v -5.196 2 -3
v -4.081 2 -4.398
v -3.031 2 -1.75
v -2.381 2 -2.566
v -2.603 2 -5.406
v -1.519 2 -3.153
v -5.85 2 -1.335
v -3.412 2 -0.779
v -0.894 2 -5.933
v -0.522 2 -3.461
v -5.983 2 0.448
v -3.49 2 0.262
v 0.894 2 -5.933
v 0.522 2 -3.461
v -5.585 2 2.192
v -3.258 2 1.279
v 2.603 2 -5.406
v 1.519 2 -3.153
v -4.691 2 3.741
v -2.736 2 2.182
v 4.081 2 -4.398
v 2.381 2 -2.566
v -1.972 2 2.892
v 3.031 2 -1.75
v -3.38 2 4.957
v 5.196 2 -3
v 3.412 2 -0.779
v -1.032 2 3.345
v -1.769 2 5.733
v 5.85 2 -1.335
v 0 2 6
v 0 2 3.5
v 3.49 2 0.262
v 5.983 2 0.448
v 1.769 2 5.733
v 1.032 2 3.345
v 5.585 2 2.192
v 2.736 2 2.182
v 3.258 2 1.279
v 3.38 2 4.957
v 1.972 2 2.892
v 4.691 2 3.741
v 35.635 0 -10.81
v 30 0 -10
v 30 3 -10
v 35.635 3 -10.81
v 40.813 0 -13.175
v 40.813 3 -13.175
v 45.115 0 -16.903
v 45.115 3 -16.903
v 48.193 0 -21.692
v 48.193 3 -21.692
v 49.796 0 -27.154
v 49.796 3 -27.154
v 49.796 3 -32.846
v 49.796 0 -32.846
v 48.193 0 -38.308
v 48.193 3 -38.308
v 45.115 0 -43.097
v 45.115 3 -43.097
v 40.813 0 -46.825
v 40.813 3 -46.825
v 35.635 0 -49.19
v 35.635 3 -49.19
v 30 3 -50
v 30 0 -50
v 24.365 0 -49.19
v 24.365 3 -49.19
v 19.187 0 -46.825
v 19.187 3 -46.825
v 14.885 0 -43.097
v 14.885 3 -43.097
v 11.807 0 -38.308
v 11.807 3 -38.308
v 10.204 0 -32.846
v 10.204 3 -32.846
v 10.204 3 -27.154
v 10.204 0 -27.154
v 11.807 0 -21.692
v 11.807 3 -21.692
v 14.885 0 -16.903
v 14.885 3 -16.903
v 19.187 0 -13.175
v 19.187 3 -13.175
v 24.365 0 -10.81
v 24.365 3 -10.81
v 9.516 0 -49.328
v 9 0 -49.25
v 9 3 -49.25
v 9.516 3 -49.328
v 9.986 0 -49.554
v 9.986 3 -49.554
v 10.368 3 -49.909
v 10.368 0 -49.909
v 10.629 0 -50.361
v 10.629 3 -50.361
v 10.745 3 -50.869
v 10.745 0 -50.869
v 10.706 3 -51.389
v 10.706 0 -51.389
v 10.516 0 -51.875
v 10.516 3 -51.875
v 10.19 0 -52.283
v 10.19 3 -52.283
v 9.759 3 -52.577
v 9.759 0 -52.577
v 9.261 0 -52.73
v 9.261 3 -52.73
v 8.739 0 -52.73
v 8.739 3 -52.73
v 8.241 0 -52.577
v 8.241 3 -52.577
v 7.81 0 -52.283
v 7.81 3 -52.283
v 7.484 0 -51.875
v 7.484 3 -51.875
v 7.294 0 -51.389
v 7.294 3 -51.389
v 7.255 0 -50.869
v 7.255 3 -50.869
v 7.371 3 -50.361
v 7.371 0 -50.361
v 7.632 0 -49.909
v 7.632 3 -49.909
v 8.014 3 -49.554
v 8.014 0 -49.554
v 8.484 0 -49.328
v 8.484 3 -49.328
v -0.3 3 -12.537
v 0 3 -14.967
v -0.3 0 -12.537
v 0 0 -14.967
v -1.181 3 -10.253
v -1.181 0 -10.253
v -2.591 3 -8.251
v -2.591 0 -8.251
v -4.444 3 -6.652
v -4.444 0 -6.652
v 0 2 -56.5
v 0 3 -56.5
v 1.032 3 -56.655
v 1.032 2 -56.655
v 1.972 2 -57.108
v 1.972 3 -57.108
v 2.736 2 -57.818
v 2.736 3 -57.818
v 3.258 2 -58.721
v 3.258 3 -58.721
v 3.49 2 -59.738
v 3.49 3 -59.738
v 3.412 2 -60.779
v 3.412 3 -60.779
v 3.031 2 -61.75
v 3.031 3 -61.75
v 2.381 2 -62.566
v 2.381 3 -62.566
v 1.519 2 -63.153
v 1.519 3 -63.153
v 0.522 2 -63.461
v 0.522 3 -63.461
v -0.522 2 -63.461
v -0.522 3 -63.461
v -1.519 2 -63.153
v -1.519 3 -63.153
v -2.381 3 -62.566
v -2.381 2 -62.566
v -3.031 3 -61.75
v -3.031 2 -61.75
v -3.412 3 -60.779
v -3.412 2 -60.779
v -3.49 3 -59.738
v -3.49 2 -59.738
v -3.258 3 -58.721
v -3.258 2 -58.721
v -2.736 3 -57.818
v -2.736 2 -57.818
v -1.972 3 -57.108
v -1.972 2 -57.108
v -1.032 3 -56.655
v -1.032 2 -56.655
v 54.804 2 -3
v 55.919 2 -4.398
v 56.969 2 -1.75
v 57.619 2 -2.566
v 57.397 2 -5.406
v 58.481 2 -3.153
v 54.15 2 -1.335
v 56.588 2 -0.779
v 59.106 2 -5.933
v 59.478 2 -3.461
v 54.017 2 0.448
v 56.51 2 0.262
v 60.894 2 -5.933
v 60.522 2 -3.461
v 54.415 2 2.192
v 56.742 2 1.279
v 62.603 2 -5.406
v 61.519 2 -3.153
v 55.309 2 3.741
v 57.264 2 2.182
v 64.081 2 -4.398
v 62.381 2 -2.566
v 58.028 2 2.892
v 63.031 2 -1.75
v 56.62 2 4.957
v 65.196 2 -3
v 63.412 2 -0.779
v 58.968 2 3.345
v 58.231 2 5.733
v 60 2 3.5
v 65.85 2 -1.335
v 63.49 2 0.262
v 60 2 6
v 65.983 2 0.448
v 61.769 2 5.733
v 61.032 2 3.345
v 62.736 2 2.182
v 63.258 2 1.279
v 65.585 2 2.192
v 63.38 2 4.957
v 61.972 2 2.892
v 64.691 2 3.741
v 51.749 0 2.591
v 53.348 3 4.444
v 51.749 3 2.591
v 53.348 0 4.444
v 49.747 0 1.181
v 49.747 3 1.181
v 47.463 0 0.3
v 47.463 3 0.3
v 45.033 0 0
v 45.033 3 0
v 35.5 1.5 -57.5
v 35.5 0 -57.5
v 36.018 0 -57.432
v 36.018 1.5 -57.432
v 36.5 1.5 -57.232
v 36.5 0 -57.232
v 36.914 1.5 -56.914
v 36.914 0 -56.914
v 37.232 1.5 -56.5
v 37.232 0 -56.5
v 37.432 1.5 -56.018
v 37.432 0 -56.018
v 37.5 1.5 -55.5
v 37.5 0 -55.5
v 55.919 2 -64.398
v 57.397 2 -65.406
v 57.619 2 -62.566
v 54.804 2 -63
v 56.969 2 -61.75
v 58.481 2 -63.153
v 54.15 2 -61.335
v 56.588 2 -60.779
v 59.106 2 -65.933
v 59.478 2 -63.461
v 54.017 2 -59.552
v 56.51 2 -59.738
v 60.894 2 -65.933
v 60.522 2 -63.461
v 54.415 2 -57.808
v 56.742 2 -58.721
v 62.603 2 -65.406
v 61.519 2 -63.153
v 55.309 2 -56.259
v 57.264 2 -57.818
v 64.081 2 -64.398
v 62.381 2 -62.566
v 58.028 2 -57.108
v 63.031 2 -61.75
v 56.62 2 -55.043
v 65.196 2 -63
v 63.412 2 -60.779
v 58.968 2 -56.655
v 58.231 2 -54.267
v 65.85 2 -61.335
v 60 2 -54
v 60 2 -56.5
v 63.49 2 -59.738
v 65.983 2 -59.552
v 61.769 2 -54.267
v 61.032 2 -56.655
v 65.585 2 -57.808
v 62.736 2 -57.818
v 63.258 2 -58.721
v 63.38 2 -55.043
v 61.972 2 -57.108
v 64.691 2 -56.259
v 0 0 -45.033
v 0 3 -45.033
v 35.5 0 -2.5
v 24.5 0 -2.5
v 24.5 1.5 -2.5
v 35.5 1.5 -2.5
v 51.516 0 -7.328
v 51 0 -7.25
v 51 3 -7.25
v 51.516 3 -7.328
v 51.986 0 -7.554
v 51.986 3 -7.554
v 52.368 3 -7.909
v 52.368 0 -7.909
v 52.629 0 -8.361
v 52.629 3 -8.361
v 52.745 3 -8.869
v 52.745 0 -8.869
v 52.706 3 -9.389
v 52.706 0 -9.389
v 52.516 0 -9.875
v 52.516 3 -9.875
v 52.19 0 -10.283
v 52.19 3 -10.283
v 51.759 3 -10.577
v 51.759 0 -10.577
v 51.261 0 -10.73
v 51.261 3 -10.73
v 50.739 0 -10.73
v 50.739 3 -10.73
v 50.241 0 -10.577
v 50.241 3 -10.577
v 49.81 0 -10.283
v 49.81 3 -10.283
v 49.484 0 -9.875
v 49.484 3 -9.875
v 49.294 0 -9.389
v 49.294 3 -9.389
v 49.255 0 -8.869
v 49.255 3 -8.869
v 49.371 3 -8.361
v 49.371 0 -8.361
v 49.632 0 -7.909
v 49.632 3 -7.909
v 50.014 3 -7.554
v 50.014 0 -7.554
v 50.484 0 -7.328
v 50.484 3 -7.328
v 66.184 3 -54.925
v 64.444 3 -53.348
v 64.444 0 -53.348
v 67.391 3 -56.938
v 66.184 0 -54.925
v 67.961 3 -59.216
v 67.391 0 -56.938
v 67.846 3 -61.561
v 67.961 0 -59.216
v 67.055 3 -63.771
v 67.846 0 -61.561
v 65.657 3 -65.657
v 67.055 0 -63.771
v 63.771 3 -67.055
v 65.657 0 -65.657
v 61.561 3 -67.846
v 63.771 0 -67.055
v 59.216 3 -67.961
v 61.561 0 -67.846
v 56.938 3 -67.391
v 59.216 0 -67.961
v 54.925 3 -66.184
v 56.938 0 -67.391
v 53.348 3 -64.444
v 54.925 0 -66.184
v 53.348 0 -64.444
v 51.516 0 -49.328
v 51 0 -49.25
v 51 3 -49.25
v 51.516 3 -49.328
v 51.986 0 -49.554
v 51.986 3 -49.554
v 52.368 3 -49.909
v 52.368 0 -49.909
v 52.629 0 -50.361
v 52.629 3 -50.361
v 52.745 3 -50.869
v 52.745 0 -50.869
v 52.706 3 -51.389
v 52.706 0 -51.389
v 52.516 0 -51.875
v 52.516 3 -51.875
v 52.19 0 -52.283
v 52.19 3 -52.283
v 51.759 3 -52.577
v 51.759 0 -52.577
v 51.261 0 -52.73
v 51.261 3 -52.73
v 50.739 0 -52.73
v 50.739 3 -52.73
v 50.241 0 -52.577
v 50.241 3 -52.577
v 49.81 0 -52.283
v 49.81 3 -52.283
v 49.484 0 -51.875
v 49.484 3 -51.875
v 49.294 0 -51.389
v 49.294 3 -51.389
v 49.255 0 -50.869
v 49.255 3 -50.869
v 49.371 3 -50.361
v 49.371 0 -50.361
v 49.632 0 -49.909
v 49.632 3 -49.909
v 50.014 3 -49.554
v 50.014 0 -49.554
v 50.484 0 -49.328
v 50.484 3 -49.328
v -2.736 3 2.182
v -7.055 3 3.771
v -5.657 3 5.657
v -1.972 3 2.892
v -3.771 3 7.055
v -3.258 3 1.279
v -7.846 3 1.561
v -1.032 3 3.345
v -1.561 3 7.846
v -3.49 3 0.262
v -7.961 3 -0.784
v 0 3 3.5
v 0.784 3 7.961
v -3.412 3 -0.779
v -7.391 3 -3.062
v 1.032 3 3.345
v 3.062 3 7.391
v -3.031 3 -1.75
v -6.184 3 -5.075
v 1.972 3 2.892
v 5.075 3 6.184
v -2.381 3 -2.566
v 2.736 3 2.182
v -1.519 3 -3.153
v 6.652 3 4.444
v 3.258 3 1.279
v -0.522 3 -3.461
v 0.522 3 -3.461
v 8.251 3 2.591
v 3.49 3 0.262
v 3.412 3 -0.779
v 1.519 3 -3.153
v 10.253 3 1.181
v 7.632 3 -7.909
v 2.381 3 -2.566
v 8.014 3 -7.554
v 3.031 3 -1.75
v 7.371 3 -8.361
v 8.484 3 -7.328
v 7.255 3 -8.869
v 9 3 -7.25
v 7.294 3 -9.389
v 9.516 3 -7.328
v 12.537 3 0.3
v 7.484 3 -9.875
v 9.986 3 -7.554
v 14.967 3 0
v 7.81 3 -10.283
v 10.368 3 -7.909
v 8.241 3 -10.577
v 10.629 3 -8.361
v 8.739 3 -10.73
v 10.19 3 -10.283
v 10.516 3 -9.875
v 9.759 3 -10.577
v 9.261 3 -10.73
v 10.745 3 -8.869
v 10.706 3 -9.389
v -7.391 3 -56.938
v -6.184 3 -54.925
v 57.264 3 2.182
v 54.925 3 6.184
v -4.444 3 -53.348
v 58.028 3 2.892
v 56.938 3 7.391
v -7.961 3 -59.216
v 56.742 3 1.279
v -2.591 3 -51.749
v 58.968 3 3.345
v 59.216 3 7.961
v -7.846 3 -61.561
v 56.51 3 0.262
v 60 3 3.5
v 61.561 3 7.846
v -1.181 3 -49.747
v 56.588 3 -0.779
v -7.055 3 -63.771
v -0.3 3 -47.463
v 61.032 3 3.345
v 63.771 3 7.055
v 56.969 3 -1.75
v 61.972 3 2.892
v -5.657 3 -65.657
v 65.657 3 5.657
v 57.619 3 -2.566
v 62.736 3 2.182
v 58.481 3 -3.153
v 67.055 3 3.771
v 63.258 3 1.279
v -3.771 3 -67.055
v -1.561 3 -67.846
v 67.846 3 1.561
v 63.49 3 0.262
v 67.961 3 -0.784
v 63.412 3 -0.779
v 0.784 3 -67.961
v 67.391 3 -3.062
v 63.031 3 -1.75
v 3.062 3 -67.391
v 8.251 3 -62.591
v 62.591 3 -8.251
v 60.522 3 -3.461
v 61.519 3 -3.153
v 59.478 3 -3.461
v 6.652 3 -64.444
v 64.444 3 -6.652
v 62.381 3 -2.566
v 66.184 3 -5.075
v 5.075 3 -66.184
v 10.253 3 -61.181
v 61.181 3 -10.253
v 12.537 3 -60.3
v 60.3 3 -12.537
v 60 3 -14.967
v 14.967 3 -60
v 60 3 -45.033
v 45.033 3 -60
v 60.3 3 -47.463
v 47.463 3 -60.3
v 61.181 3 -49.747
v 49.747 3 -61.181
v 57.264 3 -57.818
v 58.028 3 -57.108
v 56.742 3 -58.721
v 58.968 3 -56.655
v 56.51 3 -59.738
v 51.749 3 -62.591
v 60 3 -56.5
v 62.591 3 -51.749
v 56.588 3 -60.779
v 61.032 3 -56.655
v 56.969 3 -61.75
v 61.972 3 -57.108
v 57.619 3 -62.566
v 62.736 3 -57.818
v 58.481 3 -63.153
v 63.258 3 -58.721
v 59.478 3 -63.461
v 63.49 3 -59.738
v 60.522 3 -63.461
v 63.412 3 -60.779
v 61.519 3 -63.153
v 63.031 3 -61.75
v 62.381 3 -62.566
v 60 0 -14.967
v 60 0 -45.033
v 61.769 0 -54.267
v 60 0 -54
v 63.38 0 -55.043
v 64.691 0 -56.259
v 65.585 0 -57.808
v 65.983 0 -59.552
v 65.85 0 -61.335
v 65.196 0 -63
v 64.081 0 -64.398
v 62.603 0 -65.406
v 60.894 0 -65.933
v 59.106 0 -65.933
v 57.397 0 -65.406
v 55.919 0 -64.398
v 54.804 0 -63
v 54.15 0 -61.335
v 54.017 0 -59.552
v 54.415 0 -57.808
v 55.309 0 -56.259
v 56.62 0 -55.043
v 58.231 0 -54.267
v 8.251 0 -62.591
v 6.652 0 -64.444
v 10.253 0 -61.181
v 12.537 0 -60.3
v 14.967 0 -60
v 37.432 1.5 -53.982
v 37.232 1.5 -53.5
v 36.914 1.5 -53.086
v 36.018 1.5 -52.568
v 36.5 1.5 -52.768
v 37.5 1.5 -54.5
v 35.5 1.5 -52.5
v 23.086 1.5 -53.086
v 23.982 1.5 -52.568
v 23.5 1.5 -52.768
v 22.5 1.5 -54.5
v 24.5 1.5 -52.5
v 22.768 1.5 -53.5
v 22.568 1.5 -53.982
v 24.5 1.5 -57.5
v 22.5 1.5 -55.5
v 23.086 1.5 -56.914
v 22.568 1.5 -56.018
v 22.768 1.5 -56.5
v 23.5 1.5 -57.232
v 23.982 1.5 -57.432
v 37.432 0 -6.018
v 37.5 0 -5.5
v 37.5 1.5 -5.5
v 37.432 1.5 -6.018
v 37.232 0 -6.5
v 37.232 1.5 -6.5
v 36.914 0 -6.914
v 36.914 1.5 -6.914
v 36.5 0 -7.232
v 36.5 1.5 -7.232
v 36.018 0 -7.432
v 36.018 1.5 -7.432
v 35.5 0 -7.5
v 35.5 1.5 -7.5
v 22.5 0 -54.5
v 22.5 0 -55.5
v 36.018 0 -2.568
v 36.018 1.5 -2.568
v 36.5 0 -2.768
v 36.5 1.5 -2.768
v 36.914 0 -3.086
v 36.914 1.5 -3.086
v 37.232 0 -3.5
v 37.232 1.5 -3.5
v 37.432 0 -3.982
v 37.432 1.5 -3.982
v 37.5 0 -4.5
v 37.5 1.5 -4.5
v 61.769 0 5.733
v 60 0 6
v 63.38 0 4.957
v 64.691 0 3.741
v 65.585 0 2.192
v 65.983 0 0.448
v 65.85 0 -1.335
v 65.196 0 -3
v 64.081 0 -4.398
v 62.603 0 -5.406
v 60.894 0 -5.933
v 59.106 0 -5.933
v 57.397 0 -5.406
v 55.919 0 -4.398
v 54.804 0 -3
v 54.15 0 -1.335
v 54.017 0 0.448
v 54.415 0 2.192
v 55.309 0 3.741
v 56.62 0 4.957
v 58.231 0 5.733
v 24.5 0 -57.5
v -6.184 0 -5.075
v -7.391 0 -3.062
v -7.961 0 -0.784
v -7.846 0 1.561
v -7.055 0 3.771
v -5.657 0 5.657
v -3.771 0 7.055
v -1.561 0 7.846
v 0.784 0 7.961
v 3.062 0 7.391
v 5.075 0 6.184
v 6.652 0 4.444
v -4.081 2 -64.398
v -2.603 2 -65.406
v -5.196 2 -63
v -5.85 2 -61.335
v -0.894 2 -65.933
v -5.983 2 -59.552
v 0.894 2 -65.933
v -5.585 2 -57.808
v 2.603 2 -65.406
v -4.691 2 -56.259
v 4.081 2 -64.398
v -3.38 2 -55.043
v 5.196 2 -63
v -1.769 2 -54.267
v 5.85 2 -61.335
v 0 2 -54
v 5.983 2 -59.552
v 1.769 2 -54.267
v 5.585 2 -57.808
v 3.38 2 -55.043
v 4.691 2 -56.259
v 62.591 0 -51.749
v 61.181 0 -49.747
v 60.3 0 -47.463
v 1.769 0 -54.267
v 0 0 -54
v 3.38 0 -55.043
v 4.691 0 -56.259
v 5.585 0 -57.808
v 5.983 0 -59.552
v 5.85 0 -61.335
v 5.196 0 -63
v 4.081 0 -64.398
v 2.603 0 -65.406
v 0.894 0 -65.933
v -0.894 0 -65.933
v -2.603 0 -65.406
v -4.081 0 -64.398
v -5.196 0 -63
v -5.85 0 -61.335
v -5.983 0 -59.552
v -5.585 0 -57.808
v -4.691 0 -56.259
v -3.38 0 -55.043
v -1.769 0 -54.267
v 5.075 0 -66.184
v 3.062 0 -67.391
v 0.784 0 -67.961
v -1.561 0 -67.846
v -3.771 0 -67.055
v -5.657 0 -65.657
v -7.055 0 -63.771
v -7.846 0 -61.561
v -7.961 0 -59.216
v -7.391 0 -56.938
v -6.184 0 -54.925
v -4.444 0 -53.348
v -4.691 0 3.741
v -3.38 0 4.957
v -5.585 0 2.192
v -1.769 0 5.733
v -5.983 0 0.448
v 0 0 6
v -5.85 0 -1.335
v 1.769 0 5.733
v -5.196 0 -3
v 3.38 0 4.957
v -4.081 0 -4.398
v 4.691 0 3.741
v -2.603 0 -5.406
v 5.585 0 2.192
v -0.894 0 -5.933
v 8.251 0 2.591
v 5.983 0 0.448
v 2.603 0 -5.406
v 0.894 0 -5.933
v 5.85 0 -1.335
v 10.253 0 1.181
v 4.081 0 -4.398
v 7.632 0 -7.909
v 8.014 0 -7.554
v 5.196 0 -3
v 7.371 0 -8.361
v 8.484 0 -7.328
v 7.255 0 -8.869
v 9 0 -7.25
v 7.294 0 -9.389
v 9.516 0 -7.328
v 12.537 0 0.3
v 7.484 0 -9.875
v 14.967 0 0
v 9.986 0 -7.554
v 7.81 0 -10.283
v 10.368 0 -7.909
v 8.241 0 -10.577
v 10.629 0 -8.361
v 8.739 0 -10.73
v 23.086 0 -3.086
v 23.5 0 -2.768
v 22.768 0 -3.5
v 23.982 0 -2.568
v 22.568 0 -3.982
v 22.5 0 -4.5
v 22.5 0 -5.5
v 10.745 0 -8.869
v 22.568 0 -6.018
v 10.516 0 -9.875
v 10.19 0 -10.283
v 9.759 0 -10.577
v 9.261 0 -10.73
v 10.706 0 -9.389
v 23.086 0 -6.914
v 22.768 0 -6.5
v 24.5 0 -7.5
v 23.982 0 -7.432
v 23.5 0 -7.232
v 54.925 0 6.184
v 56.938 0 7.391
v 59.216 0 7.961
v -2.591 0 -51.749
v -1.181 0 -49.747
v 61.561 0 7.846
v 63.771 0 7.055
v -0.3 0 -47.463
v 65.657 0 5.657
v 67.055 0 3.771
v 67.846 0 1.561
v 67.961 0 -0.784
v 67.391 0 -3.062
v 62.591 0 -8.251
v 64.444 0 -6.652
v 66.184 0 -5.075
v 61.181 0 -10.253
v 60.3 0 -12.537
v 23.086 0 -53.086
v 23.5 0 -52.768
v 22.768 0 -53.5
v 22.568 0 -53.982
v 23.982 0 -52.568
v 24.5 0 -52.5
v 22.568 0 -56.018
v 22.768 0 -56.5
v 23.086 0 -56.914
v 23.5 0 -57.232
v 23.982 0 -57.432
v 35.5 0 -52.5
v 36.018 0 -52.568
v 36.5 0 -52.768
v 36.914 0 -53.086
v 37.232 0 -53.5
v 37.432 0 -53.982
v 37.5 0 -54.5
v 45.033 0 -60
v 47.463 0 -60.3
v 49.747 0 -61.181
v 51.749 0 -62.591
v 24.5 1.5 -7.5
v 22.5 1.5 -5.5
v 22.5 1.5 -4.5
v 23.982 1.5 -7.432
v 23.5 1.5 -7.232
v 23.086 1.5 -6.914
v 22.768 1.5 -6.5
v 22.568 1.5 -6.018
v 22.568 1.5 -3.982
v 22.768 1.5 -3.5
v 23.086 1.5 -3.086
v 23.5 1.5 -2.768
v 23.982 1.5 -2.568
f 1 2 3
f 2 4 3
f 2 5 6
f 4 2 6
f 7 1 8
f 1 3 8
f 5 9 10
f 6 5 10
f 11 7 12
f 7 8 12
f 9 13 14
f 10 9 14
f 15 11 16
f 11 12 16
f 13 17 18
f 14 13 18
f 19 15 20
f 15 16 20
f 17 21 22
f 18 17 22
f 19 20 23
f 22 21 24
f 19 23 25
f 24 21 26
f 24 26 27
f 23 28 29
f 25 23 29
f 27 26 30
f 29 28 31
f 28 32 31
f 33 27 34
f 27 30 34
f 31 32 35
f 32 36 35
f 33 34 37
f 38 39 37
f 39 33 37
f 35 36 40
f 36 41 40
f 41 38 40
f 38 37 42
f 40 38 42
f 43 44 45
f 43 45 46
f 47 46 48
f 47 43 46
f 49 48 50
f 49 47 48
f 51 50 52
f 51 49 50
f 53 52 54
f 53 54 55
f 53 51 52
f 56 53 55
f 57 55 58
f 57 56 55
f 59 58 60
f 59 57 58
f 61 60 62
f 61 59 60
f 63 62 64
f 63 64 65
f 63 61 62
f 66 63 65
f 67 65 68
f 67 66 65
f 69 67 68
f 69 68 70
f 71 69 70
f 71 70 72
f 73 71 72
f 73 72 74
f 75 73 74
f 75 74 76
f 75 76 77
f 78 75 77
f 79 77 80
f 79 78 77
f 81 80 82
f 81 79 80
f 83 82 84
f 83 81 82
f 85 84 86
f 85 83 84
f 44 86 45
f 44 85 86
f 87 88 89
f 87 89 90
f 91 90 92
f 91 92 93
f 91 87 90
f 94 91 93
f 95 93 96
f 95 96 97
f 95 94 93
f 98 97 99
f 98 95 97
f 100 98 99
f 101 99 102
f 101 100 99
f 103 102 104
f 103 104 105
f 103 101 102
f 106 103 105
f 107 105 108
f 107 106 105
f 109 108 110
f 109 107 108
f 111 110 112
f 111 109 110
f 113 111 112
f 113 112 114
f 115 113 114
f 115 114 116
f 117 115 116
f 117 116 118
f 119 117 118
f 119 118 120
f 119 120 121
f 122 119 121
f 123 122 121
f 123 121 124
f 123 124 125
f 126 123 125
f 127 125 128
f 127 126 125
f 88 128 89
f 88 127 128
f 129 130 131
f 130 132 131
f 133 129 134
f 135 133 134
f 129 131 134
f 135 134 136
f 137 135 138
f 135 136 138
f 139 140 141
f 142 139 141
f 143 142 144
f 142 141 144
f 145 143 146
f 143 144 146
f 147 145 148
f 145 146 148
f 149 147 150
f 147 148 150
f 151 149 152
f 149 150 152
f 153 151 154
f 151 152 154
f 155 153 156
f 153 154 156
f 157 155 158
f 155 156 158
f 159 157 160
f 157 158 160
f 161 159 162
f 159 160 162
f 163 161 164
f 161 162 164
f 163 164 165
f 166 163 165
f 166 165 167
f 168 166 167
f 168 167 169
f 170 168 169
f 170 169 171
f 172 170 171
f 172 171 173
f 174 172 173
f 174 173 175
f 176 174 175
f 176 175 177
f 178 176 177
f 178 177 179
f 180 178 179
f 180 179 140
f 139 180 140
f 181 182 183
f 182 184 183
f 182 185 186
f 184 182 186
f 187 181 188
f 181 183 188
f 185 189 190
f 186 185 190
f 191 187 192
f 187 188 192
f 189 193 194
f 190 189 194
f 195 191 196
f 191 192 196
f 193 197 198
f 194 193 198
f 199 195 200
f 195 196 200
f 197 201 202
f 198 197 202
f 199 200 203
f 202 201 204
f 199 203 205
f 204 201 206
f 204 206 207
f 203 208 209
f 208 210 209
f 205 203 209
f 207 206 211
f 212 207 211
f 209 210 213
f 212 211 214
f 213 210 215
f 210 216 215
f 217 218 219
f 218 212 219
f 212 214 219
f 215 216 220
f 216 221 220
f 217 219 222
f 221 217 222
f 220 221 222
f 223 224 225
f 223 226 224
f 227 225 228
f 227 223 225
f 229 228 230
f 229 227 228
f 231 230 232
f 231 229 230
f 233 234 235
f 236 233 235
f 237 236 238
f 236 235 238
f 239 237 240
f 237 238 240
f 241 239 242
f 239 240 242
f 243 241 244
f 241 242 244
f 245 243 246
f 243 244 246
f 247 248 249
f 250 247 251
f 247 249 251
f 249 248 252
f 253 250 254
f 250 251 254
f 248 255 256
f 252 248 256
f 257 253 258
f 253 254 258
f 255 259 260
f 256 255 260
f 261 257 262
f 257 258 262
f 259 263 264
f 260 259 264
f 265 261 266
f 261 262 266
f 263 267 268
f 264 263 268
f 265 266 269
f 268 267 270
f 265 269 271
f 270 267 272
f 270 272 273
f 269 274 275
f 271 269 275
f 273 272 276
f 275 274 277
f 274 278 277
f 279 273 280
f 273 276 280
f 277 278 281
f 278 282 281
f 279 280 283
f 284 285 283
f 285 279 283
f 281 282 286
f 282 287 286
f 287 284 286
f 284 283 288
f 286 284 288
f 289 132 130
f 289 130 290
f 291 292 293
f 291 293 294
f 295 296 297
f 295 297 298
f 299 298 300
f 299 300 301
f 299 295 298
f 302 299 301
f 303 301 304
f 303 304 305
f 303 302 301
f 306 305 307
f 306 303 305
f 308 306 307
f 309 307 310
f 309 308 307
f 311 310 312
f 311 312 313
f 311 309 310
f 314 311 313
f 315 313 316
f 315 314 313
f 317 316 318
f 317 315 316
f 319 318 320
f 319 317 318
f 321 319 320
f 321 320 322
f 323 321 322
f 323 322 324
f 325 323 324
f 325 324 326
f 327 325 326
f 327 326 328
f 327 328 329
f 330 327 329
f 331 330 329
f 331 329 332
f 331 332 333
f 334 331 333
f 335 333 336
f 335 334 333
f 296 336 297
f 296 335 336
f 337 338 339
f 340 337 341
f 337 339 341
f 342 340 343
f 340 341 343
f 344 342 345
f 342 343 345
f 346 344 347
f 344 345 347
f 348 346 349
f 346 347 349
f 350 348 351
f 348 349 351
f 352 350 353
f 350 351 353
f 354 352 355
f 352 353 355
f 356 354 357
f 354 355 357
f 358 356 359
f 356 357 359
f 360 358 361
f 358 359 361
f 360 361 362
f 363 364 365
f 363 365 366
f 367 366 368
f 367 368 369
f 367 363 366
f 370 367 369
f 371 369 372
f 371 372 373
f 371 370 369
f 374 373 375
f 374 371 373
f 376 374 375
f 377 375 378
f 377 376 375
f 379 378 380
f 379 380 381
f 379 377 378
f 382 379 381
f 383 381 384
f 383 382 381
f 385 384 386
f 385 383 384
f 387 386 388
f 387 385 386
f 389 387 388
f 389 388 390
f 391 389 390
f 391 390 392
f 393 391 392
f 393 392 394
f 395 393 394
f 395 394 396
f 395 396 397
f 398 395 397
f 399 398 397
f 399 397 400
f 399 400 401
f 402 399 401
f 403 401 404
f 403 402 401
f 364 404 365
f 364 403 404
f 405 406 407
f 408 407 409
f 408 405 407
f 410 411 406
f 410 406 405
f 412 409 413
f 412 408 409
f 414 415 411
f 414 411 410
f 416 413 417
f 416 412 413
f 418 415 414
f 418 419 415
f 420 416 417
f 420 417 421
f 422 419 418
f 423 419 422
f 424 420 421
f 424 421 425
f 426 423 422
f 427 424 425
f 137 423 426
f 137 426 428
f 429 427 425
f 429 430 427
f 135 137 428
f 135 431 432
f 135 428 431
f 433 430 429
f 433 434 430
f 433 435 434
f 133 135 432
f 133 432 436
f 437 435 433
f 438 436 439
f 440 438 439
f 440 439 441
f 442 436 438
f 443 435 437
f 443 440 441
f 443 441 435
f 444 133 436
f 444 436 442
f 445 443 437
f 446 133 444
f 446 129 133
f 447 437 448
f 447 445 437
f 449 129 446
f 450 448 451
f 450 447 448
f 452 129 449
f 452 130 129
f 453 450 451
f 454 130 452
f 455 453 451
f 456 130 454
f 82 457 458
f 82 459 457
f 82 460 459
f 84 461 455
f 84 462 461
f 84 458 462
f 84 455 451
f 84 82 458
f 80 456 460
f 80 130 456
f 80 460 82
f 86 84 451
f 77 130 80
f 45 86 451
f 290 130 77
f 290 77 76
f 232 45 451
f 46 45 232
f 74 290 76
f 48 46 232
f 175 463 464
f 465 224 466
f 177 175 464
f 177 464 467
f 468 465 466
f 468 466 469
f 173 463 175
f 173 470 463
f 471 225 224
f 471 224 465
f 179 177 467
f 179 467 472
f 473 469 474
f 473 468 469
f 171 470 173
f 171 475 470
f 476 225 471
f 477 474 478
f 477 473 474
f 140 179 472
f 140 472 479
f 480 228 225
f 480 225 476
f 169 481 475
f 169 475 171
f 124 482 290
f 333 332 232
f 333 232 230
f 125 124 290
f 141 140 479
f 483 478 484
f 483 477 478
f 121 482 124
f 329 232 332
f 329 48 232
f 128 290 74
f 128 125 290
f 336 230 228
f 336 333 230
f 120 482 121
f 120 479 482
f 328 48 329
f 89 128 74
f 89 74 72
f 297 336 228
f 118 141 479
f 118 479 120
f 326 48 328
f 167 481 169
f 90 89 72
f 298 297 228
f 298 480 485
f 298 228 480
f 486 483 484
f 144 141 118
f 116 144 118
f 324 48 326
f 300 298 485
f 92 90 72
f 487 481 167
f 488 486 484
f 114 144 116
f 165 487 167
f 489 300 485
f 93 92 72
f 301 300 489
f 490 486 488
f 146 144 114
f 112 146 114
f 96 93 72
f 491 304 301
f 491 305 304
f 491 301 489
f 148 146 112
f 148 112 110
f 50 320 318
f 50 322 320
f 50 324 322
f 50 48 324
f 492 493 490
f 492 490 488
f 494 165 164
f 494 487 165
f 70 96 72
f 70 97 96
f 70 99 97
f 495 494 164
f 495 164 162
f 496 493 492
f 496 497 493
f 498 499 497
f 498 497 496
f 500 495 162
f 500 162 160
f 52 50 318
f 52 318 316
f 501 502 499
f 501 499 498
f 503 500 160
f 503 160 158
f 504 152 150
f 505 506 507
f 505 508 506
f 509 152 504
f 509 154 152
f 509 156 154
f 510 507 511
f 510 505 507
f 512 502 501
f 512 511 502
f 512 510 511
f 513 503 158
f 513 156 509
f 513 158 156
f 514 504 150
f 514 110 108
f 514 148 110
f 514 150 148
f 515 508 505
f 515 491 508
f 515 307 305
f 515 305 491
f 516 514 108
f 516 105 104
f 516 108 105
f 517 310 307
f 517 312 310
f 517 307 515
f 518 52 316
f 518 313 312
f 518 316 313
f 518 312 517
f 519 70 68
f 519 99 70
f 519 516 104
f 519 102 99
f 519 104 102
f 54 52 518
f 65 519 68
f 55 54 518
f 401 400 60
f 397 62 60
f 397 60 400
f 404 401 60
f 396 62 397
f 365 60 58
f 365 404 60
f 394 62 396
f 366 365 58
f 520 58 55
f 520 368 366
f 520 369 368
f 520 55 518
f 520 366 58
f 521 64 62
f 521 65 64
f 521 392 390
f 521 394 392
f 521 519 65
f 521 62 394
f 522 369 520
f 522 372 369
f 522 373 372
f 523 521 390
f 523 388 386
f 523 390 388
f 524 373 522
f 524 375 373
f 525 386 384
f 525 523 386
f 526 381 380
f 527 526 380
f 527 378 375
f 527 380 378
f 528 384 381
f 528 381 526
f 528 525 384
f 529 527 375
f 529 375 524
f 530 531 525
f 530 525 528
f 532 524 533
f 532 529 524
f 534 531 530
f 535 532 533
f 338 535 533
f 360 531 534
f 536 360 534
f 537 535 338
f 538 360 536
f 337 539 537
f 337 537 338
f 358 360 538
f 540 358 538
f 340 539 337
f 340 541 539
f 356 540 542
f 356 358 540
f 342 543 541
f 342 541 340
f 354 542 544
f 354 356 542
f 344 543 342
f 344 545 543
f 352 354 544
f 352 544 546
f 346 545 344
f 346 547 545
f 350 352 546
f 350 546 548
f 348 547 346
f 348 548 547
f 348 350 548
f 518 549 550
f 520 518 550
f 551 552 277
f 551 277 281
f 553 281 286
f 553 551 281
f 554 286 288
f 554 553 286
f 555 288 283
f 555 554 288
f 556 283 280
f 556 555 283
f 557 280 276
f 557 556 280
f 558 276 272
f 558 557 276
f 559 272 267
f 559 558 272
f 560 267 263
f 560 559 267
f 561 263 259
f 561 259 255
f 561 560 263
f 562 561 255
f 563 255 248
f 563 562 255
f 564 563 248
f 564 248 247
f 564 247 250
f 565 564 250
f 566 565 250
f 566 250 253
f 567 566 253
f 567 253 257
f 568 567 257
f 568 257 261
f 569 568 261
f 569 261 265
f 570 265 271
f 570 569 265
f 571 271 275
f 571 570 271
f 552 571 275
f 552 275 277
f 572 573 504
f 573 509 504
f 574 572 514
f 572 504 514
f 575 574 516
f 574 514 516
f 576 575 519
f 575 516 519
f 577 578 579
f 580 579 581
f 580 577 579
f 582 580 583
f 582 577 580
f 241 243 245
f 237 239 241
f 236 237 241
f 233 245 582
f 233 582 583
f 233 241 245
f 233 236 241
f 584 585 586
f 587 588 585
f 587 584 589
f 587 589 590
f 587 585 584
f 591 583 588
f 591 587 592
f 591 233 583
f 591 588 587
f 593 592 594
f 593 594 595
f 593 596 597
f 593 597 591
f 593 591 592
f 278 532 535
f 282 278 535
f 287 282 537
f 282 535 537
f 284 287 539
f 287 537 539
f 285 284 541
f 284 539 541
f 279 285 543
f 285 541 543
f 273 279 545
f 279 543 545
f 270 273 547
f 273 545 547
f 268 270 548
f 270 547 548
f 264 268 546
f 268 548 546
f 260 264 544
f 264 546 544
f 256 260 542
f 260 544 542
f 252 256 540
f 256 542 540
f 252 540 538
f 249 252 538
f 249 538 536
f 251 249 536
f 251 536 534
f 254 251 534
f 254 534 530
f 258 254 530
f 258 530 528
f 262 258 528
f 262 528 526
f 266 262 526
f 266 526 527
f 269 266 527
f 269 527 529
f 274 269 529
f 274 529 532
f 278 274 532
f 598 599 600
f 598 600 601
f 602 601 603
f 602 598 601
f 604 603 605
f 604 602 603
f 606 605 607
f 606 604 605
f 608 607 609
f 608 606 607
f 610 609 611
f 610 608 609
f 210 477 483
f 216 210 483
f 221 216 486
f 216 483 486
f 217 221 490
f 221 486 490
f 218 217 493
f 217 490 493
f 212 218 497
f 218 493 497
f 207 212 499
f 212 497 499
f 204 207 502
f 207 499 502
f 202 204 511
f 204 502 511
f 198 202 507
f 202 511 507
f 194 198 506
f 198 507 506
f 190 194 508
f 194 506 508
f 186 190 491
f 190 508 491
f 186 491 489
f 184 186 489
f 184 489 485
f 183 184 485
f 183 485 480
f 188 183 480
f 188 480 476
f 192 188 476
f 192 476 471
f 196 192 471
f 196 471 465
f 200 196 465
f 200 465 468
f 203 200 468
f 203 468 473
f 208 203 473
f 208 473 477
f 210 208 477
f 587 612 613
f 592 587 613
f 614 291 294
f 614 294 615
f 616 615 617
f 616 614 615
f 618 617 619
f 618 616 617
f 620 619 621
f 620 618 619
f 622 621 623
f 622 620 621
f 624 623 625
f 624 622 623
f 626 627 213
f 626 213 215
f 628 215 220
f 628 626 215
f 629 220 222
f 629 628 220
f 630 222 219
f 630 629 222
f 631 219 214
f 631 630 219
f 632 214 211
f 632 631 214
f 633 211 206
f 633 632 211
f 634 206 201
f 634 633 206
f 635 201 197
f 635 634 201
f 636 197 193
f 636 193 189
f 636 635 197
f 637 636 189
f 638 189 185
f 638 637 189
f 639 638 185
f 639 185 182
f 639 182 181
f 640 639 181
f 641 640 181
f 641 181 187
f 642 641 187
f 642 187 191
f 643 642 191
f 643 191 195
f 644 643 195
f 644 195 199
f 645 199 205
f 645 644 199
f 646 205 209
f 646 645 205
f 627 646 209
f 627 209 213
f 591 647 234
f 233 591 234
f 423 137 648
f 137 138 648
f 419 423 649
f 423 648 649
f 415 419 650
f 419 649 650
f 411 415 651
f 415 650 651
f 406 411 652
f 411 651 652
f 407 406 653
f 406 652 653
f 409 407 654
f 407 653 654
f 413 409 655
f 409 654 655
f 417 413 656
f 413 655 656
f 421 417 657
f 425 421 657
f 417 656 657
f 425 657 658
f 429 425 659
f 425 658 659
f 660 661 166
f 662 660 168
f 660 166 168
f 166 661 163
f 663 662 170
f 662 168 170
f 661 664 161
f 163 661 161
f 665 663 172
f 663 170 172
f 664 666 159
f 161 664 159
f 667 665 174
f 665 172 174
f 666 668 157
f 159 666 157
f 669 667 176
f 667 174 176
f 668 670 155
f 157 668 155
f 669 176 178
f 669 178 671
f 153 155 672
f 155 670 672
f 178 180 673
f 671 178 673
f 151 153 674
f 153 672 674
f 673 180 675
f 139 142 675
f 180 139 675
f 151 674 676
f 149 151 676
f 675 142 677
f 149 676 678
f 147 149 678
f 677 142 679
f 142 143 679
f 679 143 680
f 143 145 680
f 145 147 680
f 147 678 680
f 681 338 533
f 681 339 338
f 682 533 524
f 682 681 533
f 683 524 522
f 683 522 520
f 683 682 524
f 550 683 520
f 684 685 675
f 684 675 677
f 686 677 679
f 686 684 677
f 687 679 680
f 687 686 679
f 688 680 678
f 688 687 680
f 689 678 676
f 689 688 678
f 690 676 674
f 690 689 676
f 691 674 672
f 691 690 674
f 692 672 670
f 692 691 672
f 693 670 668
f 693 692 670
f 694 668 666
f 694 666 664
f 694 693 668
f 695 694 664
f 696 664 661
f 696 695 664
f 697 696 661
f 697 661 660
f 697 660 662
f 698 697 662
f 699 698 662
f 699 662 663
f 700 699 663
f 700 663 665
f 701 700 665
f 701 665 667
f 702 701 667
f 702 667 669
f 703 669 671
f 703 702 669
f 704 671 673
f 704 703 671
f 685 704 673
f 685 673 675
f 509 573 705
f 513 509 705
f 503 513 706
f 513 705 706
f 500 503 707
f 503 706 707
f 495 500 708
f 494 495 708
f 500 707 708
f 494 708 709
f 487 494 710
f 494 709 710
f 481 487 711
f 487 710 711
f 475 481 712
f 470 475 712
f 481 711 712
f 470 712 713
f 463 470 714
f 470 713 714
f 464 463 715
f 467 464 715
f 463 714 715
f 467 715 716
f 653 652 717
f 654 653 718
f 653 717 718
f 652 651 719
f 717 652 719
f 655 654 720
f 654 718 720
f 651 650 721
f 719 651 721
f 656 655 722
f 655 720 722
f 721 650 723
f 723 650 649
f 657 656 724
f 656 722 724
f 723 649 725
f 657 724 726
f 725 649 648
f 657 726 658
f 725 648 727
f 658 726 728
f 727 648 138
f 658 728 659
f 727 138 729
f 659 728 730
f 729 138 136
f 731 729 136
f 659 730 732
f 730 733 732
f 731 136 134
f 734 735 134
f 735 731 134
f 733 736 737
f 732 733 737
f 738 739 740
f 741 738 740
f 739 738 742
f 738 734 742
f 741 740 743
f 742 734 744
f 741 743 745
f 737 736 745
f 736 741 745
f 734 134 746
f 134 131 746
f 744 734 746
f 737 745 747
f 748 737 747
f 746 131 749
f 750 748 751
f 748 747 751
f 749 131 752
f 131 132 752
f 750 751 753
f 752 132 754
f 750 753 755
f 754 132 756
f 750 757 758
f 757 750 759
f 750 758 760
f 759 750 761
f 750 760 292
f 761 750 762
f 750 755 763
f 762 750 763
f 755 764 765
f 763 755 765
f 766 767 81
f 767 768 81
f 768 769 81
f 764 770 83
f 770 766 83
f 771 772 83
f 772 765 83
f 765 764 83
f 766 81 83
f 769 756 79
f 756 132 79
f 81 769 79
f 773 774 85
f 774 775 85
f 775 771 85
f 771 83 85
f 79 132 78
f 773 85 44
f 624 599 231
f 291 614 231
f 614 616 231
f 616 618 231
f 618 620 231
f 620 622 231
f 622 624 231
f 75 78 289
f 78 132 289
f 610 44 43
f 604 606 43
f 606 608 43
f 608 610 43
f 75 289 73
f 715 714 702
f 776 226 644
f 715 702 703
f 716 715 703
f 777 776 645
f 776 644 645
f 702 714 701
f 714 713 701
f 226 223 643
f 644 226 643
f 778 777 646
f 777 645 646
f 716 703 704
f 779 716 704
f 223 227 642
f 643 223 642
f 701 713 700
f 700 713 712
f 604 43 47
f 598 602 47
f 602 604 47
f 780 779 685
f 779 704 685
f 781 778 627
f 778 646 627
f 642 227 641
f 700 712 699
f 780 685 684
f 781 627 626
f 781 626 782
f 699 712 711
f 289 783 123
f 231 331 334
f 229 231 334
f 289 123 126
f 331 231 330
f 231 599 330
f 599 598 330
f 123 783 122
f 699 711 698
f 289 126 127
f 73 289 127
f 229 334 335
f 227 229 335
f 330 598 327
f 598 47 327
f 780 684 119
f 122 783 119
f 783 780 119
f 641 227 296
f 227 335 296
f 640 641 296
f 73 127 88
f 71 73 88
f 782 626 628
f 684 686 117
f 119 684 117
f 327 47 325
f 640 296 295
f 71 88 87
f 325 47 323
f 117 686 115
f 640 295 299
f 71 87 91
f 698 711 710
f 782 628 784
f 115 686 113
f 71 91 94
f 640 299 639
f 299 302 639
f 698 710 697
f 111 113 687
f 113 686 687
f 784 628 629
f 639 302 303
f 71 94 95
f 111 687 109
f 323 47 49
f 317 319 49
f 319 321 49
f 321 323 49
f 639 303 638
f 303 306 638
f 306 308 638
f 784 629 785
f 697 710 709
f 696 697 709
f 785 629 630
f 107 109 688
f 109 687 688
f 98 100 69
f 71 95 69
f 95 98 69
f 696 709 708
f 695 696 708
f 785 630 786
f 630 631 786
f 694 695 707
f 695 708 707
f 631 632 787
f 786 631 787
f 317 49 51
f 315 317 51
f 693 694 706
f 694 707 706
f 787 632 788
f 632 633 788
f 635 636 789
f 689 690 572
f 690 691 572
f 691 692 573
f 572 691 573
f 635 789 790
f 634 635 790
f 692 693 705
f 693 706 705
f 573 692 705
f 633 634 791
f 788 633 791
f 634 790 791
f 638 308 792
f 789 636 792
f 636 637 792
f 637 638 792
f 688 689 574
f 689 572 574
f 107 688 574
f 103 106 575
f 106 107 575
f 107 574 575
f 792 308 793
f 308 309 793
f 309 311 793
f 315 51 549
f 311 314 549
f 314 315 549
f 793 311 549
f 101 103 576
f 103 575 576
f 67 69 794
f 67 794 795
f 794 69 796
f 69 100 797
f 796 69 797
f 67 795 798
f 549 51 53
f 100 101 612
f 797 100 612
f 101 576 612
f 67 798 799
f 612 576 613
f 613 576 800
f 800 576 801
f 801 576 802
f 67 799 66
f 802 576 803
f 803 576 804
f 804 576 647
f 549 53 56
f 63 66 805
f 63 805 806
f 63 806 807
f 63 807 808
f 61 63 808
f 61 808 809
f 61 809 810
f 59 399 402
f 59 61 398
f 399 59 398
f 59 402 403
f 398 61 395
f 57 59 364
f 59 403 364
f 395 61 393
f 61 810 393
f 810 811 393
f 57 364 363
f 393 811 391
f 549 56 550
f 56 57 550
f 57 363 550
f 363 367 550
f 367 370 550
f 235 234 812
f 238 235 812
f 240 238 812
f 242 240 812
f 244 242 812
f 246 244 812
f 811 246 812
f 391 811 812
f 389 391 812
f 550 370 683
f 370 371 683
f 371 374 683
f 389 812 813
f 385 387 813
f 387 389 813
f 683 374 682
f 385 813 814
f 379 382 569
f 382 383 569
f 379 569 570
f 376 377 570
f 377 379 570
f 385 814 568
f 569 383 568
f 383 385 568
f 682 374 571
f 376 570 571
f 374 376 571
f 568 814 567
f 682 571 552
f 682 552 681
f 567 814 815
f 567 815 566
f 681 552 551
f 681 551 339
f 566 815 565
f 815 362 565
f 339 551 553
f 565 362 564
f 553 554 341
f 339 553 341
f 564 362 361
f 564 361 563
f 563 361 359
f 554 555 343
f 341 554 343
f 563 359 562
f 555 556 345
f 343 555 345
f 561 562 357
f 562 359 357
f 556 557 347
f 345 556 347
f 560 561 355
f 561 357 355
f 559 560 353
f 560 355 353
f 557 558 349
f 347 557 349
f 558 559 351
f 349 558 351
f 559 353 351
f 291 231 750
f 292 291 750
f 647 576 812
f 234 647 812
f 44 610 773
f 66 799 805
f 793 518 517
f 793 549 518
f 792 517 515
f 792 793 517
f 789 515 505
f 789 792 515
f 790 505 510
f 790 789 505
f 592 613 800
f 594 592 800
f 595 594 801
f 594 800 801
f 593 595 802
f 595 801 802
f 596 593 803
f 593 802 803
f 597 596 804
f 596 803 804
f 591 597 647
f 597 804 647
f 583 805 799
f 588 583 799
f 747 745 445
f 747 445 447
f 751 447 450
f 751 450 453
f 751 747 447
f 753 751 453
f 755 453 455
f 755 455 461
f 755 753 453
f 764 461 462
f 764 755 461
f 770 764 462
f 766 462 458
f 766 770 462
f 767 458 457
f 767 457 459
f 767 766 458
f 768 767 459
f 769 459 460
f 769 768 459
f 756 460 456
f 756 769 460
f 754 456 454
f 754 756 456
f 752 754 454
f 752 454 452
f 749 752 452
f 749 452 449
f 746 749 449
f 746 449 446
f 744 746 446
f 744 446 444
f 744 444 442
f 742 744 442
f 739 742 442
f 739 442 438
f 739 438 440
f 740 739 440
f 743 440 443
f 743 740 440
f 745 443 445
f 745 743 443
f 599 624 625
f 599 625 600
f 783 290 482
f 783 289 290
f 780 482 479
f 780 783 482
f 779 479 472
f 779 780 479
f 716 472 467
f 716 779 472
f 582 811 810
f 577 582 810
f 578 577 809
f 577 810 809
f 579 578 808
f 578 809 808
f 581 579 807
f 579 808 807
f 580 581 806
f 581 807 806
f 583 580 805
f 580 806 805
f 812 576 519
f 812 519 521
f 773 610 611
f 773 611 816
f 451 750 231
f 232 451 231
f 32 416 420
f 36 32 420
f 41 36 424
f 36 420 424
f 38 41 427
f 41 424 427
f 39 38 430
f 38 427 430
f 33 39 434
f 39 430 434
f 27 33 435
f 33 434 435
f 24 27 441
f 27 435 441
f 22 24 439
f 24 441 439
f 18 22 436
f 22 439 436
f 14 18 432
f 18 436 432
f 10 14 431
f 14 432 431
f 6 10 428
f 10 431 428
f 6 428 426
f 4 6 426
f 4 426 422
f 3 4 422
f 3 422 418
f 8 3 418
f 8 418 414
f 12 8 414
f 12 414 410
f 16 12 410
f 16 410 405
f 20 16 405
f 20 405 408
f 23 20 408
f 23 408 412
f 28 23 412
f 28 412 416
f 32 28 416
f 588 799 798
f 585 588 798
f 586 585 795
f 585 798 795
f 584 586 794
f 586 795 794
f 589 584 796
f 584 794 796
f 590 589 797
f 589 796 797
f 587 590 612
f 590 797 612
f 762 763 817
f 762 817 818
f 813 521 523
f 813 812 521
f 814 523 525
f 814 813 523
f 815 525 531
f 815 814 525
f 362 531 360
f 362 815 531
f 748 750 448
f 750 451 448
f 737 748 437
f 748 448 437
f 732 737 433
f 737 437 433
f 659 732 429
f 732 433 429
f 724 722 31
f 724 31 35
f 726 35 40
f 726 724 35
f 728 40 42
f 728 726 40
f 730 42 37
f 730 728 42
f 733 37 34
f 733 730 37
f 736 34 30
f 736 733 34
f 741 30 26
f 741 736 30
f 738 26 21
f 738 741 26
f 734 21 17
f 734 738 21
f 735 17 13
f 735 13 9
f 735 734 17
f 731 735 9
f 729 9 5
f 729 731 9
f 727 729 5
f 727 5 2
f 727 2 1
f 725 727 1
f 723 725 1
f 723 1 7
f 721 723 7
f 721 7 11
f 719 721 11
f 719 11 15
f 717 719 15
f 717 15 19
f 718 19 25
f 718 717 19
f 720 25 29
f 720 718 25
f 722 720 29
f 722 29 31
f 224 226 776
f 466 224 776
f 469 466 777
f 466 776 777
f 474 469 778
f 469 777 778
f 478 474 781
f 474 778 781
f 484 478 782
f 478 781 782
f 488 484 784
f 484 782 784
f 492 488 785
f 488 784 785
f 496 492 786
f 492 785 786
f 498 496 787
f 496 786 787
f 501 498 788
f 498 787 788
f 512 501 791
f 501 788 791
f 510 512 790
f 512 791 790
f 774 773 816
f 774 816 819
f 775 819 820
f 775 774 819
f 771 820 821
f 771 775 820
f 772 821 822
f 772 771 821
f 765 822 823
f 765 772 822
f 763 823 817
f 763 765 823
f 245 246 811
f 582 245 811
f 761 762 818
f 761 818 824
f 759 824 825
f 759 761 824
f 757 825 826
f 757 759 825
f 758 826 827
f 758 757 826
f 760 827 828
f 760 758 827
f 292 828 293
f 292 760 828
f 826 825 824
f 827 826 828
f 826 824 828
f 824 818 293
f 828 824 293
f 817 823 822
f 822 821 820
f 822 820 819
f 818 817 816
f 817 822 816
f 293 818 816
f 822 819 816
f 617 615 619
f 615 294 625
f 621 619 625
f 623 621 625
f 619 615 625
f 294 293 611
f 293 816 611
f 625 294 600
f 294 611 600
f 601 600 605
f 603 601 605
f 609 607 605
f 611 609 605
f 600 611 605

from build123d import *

# Parameters (mm, degrees)
SKETCH_1_R          = 8
SKETCH_1_W          = 60
SKETCH_1_H          = 60
SKETCH_1_R_2        = 20
SKETCH_1_R_3        = 1.75
EXTRUDE_1_DEPTH     = 3
FILLET_1_R          = 10
CUT_EXTRUDE_START   = -3
SKETCH_2_R          = 6
CUT_EXTRUDE_1_DEPTH = 2
SKETCH_2_3_R        = 3.5
CUT_EXTRUDE_3_DEPTH = 97.213304693
CUT_EXTRUDE_6_DEPTH = 1.5


with BuildPart() as part:
    # Эскиз1 → Бобышка-Вытянуть1 (new body)
    # profile 1 of 5: a face of its own
    with BuildSketch(Plane(origin=(0, 0, 0), x_dir=(1, 0, 0), z_dir=(0, 1, 0))):
        with Locations((60, 60)):
            Circle(SKETCH_1_R)
    # profile 2 of 5: a face of its own
    with BuildSketch(Plane(origin=(0, 0, 0), x_dir=(1, 0, 0), z_dir=(0, 1, 0))):
        with Locations((0, 60)):
            Circle(SKETCH_1_R)
    # profile 3 of 5: a face of its own
    with BuildSketch(Plane(origin=(0, 0, 0), x_dir=(1, 0, 0), z_dir=(0, 1, 0))):
        with Locations((60, 0)):
            Circle(SKETCH_1_R)
    # profile 4 of 5: a face of its own
    with BuildSketch(Plane(origin=(0, 0, 0), x_dir=(1, 0, 0), z_dir=(0, 1, 0))):
        Circle(SKETCH_1_R)
    # profile 5 of 5: a face of its own
    with BuildSketch(Plane(origin=(0, 0, 0), x_dir=(1, 0, 0), z_dir=(0, 1, 0))):
        with Locations((30, 30)):
            Rectangle(SKETCH_1_W, SKETCH_1_H)
        with Locations(Location((30, 30, 0), (0, 0, 270))):
            Circle(SKETCH_1_R_2, mode=Mode.SUBTRACT)
        with Locations(Location((9, 51, 0), (0, 0, 270))):
            Circle(SKETCH_1_R_3, mode=Mode.SUBTRACT)
        with Locations(Location((51, 51, 0), (0, 0, 270))):
            Circle(SKETCH_1_R_3, mode=Mode.SUBTRACT)
        with Locations(Location((51, 9, 0), (0, 0, 270))):
            Circle(SKETCH_1_R_3, mode=Mode.SUBTRACT)
        with Locations(Location((9, 9, 0), (0, 0, 270))):
            Circle(SKETCH_1_R_3, mode=Mode.SUBTRACT)
    extrude(amount=EXTRUDE_1_DEPTH)

    # Скругление1
    fillet_1_edges = [part.edges().sort_by_distance(p)[0] for p in [
        (0, 1.5, -8),
        (0, 1.5, -52),
        (8, 1.5, -60),
        (52, 1.5, -60),
        (60, 1.5, -52),
        (60, 1.5, -8),
        (52, 1.5, 0),
        (8, 1.5, 0),
    ]]
    fillet(fillet_1_edges, radius=FILLET_1_R)

    # Эскиз2 → Вырез-Вытянуть1 (cut)
    with BuildSketch(Plane(origin=(0, 3, 0), x_dir=(1, 0, 0), z_dir=(0, 1, 0)).offset(CUT_EXTRUDE_START)):
        with Locations(Location((0, 60, 0), (0, 0, 270))):
            Circle(SKETCH_2_R)
        with Locations(Location((60, 60, 0), (0, 0, 270))):
            Circle(SKETCH_2_R)
        with Locations(Location((60, 0, 0), (0, 0, 270))):
            Circle(SKETCH_2_R)
        with Locations(Location((0, 0, 0), (0, 0, 270))):
            Circle(SKETCH_2_R)
    extrude(amount=CUT_EXTRUDE_1_DEPTH, mode=Mode.SUBTRACT)

    # Эскиз2<3> → Вырез-Вытянуть3 (cut, through all)
    with BuildSketch(Plane(origin=(0, 3, 0), x_dir=(1, 0, 0), z_dir=(0, 1, 0))):
        with Locations(Location((0, 0, 0), (0, 0, 270))):
            Circle(SKETCH_2_3_R)
        with Locations(Location((0, 60, 0), (0, 0, 270))):
            Circle(SKETCH_2_3_R)
        with Locations(Location((60, 60, 0), (0, 0, 270))):
            Circle(SKETCH_2_3_R)
        with Locations(Location((60, 0, 0), (0, 0, 270))):
            Circle(SKETCH_2_3_R)
    extrude(amount=-CUT_EXTRUDE_3_DEPTH, mode=Mode.SUBTRACT)

    # Эскиз5 → Вырез-Вытянуть6 (cut)
    with BuildSketch(Plane(origin=(0, 3, 0), x_dir=(1, 0, 0), z_dir=(0, 1, 0)).offset(CUT_EXTRUDE_START)):
        with BuildLine():
            Line((24.5, 57.5), (35.5, 57.5))
            ThreePointArc((35.5, 57.5), (36.914213562, 56.914213562), (37.5, 55.5))
            Line((37.5, 55.5), (37.5, 54.5))
            ThreePointArc((37.5, 54.5), (36.914213562, 53.085786438), (35.5, 52.5))
            Line((35.5, 52.5), (24.5, 52.5))
            ThreePointArc((24.5, 52.5), (23.085786438, 53.085786438), (22.5, 54.5))
            Line((22.5, 54.5), (22.5, 55.5))
            ThreePointArc((22.5, 55.5), (23.085786438, 56.914213562), (24.5, 57.5))
        make_face()
        with BuildLine():
            Line((37.5, 4.5), (37.5, 5.5))
            ThreePointArc((37.5, 5.5), (36.914213562, 6.914213562), (35.5, 7.5))
            Line((35.5, 7.5), (24.5, 7.5))
            ThreePointArc((24.5, 7.5), (23.085786438, 6.914213562), (22.5, 5.5))
            Line((22.5, 5.5), (22.5, 4.5))
            ThreePointArc((22.5, 4.5), (23.085786438, 3.085786438), (24.5, 2.5))
            Line((24.5, 2.5), (35.5, 2.5))
            ThreePointArc((35.5, 2.5), (36.914213562, 3.085786438), (37.5, 4.5))
        make_face()
    extrude(amount=CUT_EXTRUDE_6_DEPTH, mode=Mode.SUBTRACT)


solid = part.part
